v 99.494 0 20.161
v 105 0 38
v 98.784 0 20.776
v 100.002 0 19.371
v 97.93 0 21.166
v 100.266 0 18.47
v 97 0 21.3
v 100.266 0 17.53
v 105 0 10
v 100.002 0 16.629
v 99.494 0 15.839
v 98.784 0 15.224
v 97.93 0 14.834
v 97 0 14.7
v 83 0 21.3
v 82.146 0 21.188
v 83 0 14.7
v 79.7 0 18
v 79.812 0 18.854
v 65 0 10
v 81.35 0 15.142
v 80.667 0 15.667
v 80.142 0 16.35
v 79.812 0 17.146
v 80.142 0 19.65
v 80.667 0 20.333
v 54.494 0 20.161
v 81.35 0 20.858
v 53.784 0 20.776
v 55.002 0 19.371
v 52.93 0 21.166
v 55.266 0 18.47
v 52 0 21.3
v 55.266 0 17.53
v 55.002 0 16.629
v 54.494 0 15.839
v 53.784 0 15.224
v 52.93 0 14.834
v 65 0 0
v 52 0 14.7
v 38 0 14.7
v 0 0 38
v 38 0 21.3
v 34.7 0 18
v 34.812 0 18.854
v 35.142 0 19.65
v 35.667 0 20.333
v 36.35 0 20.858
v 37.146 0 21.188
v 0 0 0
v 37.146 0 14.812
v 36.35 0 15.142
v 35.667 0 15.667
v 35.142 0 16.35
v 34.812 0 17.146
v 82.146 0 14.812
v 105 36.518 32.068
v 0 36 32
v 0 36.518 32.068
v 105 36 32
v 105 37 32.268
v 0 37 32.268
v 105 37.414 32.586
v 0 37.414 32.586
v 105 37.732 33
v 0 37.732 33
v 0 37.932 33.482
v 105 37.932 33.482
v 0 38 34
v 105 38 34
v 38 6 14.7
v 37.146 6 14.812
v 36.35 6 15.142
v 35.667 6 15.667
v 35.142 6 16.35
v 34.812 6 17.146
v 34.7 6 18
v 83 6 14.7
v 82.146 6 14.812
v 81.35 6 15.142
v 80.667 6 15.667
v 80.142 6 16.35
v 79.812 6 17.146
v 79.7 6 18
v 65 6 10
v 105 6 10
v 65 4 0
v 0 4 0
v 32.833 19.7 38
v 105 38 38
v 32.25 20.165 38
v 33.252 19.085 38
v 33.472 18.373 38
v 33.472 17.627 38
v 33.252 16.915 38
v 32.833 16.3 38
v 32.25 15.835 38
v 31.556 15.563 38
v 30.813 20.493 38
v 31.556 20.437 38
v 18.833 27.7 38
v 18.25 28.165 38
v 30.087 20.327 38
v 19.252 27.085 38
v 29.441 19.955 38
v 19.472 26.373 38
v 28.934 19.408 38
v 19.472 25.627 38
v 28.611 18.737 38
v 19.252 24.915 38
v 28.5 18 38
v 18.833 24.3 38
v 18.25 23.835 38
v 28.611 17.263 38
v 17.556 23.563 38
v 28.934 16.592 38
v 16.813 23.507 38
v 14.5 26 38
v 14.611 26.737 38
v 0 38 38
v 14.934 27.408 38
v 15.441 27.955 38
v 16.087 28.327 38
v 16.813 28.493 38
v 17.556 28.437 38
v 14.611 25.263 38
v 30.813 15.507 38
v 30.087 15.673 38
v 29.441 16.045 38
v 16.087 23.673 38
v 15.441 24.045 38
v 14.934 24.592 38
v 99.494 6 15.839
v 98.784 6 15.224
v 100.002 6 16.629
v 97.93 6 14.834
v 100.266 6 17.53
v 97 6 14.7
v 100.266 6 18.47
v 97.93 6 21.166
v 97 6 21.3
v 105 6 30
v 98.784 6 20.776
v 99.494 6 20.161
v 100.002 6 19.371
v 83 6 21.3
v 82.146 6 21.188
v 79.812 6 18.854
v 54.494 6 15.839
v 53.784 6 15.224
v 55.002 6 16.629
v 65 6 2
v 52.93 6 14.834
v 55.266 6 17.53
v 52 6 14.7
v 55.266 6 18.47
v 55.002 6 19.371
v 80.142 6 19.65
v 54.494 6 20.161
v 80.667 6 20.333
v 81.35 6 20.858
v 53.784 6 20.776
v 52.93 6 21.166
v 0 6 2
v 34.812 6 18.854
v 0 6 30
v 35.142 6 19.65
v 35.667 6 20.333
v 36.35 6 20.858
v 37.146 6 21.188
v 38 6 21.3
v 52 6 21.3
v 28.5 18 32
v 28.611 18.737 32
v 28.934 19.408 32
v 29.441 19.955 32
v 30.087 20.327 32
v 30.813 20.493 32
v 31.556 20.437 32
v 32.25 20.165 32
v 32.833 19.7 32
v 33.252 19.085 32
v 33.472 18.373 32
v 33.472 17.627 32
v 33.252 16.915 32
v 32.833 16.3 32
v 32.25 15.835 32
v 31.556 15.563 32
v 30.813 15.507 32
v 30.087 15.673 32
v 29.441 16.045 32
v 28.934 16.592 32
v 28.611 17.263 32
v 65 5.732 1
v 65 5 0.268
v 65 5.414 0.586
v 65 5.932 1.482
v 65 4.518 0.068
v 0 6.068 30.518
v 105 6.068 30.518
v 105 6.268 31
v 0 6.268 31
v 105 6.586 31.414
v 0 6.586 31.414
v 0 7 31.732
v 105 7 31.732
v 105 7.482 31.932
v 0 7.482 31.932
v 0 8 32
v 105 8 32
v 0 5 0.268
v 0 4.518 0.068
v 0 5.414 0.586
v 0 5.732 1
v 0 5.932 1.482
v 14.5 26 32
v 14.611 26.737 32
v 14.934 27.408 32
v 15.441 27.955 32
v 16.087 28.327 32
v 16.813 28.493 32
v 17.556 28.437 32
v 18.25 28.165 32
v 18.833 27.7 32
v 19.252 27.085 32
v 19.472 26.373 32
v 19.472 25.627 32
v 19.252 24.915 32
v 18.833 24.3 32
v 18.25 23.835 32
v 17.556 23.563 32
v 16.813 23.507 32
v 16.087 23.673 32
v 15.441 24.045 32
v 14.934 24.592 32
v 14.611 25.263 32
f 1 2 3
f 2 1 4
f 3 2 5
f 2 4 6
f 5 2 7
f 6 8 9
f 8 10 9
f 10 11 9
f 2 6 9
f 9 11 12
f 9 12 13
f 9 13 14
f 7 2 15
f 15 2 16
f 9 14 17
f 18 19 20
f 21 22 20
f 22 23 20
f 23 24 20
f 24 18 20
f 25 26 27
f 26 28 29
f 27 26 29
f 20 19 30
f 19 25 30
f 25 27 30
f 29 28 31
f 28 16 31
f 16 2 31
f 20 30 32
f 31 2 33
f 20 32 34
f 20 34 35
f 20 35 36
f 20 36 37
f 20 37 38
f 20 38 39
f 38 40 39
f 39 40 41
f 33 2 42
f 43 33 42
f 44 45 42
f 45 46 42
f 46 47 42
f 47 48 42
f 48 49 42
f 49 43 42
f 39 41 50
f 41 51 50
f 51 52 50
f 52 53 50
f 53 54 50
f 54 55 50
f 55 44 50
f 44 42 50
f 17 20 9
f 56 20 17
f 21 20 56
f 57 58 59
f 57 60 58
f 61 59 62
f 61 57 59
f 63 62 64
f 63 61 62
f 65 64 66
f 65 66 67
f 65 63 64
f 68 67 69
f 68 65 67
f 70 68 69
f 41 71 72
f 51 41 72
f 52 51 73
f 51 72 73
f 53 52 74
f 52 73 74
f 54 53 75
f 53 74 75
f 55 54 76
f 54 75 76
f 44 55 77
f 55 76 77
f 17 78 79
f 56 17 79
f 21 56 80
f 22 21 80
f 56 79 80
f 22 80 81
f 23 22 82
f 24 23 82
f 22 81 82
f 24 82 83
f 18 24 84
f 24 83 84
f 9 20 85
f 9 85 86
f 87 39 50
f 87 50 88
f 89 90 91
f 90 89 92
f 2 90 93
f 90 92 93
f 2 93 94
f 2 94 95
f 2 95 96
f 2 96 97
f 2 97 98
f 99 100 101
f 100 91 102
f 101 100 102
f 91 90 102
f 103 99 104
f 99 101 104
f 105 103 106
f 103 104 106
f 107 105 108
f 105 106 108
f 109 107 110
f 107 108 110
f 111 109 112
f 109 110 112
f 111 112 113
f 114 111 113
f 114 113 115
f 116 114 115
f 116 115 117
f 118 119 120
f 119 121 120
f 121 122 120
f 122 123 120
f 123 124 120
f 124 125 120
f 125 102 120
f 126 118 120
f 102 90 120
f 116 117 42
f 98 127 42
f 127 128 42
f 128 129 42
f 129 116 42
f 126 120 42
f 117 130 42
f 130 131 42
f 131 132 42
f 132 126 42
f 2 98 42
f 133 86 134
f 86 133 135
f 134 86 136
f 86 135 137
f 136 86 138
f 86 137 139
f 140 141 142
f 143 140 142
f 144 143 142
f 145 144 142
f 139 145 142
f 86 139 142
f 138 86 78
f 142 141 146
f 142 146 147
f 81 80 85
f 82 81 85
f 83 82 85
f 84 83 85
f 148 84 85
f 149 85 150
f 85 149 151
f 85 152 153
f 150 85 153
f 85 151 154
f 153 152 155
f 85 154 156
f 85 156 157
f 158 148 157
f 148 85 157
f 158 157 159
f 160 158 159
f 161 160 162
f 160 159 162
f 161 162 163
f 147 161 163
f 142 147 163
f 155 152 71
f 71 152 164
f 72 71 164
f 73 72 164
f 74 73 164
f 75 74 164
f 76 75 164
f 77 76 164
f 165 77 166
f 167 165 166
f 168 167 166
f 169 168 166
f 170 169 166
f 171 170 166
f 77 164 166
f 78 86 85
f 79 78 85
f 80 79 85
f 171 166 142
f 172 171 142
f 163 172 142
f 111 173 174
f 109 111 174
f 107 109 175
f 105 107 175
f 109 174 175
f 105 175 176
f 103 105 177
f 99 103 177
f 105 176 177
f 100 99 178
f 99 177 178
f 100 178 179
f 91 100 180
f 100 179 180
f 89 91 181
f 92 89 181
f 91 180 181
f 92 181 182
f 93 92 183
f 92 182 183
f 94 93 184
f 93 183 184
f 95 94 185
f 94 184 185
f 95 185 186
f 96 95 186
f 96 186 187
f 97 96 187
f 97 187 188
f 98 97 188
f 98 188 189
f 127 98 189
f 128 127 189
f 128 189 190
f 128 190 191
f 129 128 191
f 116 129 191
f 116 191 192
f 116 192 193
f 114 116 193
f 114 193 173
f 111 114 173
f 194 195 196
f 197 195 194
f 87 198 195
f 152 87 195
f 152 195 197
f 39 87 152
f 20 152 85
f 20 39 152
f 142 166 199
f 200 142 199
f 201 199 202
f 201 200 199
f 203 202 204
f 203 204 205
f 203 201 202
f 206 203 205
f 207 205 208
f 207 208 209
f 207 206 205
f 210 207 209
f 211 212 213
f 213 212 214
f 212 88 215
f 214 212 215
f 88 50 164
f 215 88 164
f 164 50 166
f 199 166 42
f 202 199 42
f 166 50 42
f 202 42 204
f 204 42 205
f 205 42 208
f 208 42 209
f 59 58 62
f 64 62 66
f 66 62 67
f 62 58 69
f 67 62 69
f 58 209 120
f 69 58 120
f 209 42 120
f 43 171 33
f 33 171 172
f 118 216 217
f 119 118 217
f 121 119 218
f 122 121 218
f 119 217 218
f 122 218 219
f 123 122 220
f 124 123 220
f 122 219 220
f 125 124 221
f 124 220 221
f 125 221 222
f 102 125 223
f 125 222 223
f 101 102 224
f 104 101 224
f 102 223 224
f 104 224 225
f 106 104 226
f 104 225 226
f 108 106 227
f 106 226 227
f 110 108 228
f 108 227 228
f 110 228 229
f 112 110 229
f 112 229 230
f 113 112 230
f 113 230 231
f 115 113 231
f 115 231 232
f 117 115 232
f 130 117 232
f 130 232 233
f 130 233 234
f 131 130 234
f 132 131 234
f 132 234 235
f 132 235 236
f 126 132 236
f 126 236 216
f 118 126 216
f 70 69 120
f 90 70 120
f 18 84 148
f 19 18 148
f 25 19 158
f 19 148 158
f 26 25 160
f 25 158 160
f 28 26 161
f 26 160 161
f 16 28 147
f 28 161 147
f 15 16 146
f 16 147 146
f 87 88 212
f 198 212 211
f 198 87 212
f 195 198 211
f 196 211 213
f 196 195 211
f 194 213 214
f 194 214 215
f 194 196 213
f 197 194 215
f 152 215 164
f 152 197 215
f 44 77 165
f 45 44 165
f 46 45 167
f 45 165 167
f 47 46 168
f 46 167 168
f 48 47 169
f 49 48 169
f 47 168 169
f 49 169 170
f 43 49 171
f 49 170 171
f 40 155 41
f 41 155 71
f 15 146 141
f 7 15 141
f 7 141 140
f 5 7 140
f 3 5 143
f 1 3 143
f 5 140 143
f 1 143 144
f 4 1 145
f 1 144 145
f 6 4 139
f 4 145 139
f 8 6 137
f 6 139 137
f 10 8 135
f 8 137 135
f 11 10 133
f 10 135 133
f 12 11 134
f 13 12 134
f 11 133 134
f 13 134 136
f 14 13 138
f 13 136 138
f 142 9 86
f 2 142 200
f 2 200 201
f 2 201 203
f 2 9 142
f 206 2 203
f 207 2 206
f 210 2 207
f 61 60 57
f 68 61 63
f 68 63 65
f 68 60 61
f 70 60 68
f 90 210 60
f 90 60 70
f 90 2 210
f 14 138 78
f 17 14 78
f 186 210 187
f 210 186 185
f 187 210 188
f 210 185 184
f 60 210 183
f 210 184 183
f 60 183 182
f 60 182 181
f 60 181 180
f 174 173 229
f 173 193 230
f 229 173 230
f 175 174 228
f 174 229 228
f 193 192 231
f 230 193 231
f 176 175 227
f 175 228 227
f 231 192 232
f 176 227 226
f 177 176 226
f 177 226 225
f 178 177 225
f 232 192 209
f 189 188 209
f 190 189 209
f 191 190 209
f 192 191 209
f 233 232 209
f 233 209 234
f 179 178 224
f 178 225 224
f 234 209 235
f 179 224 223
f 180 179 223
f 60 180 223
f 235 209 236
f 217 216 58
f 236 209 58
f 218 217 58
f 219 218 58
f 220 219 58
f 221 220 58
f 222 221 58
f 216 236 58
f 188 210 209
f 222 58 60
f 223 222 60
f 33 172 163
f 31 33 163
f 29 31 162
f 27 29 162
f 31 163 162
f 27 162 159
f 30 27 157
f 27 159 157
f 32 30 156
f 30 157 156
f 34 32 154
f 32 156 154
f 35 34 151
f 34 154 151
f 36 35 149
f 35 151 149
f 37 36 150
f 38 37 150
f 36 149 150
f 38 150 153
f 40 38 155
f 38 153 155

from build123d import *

# Parameters (mm, degrees)
F1_DEPTH = 105
F2_W     = 40
F2_H     = 10
F3_DEPTH = 25
F5_DEPTH = 25
F7_D     = 5
F8_R     = 2
F9_R     = 2


with BuildPart() as f1:
    # F0 (on Right) → F1 (new body)
    with BuildSketch(Plane.YZ):
        Polygon((0, 38), (0, 0), (6, 0), (6, 32), (38, 32), (38, 38), align=None)
    extrude(amount=F1_DEPTH)

    # F2 (on face) → F3 (cut)
    with BuildSketch(Plane.XZ):
        with Locations((85, 5)):
            Rectangle(F2_W, F2_H)
    extrude(amount=-F3_DEPTH, mode=Mode.SUBTRACT)

    # F4 (on face) → F5 (cut)
    with BuildSketch(Plane(origin=(0, 6, 0), x_dir=(-1, 0, 0), z_dir=(0, 1, 0))):
        with BuildLine():
            ThreePointArc((-97, 14.7), (-94.6665476221, 15.6665476221), (-93.7, 18))
            ThreePointArc((-93.7, 18), (-94.6665476221, 20.3334523779), (-97, 21.3))
            ThreePointArc((-97, 21.3), (-100.3, 18), (-97, 14.7))
        make_face()
        with BuildLine():
            ThreePointArc((-97, 21.3), (-94.6665476221, 20.3334523779), (-93.7, 18))
            ThreePointArc((-93.7, 18), (-94.6665476221, 15.6665476221), (-97, 14.7))
            Line((-97, 14.7), (-83, 14.7))
            ThreePointArc((-83, 14.7), (-86.3, 18), (-83, 21.3))
            Line((-83, 21.3), (-97, 21.3))
        make_face()
        with BuildLine():
            Line((-83, 14.7), (-83, 21.3))
            ThreePointArc((-83, 21.3), (-86.3, 18), (-83, 14.7))
        make_face()
        with BuildLine():
            ThreePointArc((-79.7, 18), (-80.6665476221, 20.3334523779), (-83, 21.3))
            Line((-83, 21.3), (-83, 14.7))
            ThreePointArc((-83, 14.7), (-80.6665476221, 15.6665476221), (-79.7, 18))
        make_face()
        with BuildLine():
            ThreePointArc((-52, 14.7), (-49.6665476221, 15.6665476221), (-48.7, 18))
            ThreePointArc((-48.7, 18), (-49.6665476221, 20.3334523779), (-52, 21.3))
            ThreePointArc((-52, 21.3), (-55.3, 18), (-52, 14.7))
        make_face()
        with BuildLine():
            ThreePointArc((-52, 21.3), (-49.6665476221, 20.3334523779), (-48.7, 18))
            ThreePointArc((-48.7, 18), (-49.6665476221, 15.6665476221), (-52, 14.7))
            Line((-52, 14.7), (-38, 14.7))
            ThreePointArc((-38, 14.7), (-41.3, 18), (-38, 21.3))
            Line((-38, 21.3), (-52, 21.3))
        make_face()
        with BuildLine():
            Line((-38, 14.7), (-38, 21.3))
            ThreePointArc((-38, 21.3), (-41.3, 18), (-38, 14.7))
        make_face()
        with BuildLine():
            ThreePointArc((-34.7, 18), (-35.6665476221, 20.3334523779), (-38, 21.3))
            Line((-38, 21.3), (-38, 14.7))
            ThreePointArc((-38, 14.7), (-35.6665476221, 15.6665476221), (-34.7, 18))
        make_face()
    extrude(amount=-F5_DEPTH, mode=Mode.SUBTRACT)

    # F7 (through all)
    with Locations(Plane.XY.offset(38)):
        with Locations((31, 18), (17, 26)):
            Hole(F7_D / 2)

    # F8
    f8_edges = [f1.edges().sort_by_distance(p)[0] for p in [
        (52.5, 38, 32),
        (32.5, 6, 0),
    ]]
    fillet(f8_edges, radius=F8_R)

    # F9
    f9_edges = [f1.edges().sort_by_distance(p)[0] for p in [
        (52.5, 6, 32),
    ]]
    fillet(f9_edges, radius=F9_R)


solid = f1.part
